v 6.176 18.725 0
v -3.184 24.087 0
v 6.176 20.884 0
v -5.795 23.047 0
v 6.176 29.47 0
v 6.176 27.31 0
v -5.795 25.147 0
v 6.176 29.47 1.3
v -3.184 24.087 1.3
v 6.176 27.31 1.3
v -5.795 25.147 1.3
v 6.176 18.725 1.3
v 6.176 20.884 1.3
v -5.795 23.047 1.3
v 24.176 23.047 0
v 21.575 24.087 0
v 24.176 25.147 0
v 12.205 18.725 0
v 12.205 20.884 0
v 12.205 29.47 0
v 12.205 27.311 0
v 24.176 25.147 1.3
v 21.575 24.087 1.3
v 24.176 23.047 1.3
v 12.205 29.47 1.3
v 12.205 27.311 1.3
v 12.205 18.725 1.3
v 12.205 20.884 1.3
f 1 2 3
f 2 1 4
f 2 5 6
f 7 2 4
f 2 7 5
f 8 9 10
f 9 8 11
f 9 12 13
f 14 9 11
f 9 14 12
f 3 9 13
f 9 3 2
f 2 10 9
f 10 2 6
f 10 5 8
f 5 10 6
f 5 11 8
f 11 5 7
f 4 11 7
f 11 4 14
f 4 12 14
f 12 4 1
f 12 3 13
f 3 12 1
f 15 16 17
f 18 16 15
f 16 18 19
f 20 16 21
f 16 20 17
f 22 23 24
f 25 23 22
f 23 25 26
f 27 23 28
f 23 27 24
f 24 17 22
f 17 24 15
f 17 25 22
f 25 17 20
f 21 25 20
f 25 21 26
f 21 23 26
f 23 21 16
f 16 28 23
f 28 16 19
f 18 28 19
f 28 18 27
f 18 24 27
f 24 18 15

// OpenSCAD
keycap_height = 7;
legend_height = 1.5;
keycap_size = 18;
legend_font_size = 14;

module keycap_with_legend(txt, legend_y_offset=0, legend_x_offset=0) {
    difference() {
        import("keycap_base.stl");

        translate([keycap_size / 2 - .25 + legend_x_offset, (keycap_size - legend_font_size) / 2 + legend_y_offset, keycap_height - legend_height])
        legend(txt, legend_height);
    }
}

module legend(txt, height) {
    linear_extrude(height)
    offset(delta = -0.1)
    text(txt, size = legend_font_size, halign = "center", font = "SF Mono:style=Bold");
}

// ------------------

module number_and_letter_keycaps() {
    s = 25;

    translate([s*0, s*0]) keycap_with_legend("O");

    translate([s*0, s*1]) keycap_with_legend("1");
    translate([s*1, s*1]) keycap_with_legend("2");
    translate([s*2, s*1]) keycap_with_legend("3");

    translate([s*0, s*2]) keycap_with_legend("4");
    translate([s*1, s*2]) keycap_with_legend("5");
    translate([s*2, s*2]) keycap_with_legend("6");

    translate([s*0, s*3]) keycap_with_legend("7");
    translate([s*1, s*3]) keycap_with_legend("8");
    translate([s*2, s*3]) keycap_with_legend("9");

    translate([s*1, s*0]) keycap_with_legend("A");
    translate([s*2, s*0]) keycap_with_legend("B");
    translate([s*3, s*0]) keycap_with_legend("C");
    translate([s*3, s*1]) keycap_with_legend("D");
    translate([s*3, s*2]) keycap_with_legend("E");
    translate([s*3, s*3]) keycap_with_legend("F");
}

module number_and_letter_legends() {
    s = 18;
    h = legend_height - 0.2;
    
    translate([s*0, s*0]) legend("O", h);

    translate([s*0, s*1]) legend("1", h);
    translate([s*1, s*1]) legend("2", h);
    translate([s*2, s*1]) legend("3", h);

    translate([s*0, s*2]) legend("4", h);
    translate([s*1, s*2]) legend("5", h);
    translate([s*2, s*2]) legend("6", h);

    translate([s*0, s*3]) legend("7", h);
    translate([s*1, s*3]) legend("8", h);
    translate([s*2, s*3]) legend("9", h);

    translate([s*1, s*0]) legend("A", h);
    translate([s*2, s*0]) legend("B", h);
    translate([s*3, s*0]) legend("C", h);
    translate([s*3, s*1]) legend("D", h);
    translate([s*3, s*2]) legend("E", h);
    translate([s*3, s*3]) legend("F", h);
}

// ------------------

module operator_keycaps() {
    s = 25;

    translate([s*0, s*0]) keycap_with_legend("+", 1);
    translate([s*1, s*0]) keycap_with_legend("−", 1);
    translate([s*2, s*0]) keycap_with_legend("×", 1);
    translate([s*3, s*0]) keycap_with_legend("÷", 1);
    
    translate([s*0, s*1]) keycap_with_legend("x", 1.7);
    translate([s*1, s*1]) keycap_with_legend("b", 0);
    translate([s*2, s*1]) keycap_with_legend("→", 0, 0.3);
}

module operator_legends() {
    s = 18;
    h = legend_height - 0.2;

    translate([s*0, s*0]) legend("+", h);
    translate([s*1, s*0]) legend("−", h);
    translate([s*2, s*0]) legend("×", h);
    translate([s*3, s*0]) legend("÷", h);
    
    translate([s*0, s*1]) legend("x", h);
    translate([s*1, s*1]) legend("b", h);
    translate([s*2, s*1]) legend("→", h);
}

// ------------------

// TODO
module special_keycaps() {
    s = 25;

    translate([s*0, s*0]) keycap_with_legend("^", -3); // Shift
    translate([s*2, s*1]) keycap_with_legend("=", 1);  // Exe
    translate([s*1, s*0]) keycap_with_legend("◦", 1);  // Menu

    translate([s*0, s*1]) keycap_with_legend("<", 1);  // Left
    translate([s*1, s*1]) keycap_with_legend(">", 1);  // Right
    
    translate([s*2, s*0]) keycap_with_legend("⌫", 0);  // Del
    
    translate([s*3, s*0]) keycap_with_legend("?", 0);  // Var
}

module special_legends() {
    s = 18;
    h = legend_height - 0.2;

    //translate([s*0, s*0]) legend("^", h); // Shift
    //translate([s*2, s*1]) legend("=", h);  // Exe
    //translate([s*1, s*0]) legend("◦", h);  // Menu

    translate([s*0, s*1]) legend("<", h);  // Left
    translate([s*1, s*1]) legend(">", h);  // Right
    
    //translate([s*2, s*0]) legend("⌫", h);  // Del
    
    //translate([s*3, s*0]) legend("?", h);  // Var
}

special_legends();
